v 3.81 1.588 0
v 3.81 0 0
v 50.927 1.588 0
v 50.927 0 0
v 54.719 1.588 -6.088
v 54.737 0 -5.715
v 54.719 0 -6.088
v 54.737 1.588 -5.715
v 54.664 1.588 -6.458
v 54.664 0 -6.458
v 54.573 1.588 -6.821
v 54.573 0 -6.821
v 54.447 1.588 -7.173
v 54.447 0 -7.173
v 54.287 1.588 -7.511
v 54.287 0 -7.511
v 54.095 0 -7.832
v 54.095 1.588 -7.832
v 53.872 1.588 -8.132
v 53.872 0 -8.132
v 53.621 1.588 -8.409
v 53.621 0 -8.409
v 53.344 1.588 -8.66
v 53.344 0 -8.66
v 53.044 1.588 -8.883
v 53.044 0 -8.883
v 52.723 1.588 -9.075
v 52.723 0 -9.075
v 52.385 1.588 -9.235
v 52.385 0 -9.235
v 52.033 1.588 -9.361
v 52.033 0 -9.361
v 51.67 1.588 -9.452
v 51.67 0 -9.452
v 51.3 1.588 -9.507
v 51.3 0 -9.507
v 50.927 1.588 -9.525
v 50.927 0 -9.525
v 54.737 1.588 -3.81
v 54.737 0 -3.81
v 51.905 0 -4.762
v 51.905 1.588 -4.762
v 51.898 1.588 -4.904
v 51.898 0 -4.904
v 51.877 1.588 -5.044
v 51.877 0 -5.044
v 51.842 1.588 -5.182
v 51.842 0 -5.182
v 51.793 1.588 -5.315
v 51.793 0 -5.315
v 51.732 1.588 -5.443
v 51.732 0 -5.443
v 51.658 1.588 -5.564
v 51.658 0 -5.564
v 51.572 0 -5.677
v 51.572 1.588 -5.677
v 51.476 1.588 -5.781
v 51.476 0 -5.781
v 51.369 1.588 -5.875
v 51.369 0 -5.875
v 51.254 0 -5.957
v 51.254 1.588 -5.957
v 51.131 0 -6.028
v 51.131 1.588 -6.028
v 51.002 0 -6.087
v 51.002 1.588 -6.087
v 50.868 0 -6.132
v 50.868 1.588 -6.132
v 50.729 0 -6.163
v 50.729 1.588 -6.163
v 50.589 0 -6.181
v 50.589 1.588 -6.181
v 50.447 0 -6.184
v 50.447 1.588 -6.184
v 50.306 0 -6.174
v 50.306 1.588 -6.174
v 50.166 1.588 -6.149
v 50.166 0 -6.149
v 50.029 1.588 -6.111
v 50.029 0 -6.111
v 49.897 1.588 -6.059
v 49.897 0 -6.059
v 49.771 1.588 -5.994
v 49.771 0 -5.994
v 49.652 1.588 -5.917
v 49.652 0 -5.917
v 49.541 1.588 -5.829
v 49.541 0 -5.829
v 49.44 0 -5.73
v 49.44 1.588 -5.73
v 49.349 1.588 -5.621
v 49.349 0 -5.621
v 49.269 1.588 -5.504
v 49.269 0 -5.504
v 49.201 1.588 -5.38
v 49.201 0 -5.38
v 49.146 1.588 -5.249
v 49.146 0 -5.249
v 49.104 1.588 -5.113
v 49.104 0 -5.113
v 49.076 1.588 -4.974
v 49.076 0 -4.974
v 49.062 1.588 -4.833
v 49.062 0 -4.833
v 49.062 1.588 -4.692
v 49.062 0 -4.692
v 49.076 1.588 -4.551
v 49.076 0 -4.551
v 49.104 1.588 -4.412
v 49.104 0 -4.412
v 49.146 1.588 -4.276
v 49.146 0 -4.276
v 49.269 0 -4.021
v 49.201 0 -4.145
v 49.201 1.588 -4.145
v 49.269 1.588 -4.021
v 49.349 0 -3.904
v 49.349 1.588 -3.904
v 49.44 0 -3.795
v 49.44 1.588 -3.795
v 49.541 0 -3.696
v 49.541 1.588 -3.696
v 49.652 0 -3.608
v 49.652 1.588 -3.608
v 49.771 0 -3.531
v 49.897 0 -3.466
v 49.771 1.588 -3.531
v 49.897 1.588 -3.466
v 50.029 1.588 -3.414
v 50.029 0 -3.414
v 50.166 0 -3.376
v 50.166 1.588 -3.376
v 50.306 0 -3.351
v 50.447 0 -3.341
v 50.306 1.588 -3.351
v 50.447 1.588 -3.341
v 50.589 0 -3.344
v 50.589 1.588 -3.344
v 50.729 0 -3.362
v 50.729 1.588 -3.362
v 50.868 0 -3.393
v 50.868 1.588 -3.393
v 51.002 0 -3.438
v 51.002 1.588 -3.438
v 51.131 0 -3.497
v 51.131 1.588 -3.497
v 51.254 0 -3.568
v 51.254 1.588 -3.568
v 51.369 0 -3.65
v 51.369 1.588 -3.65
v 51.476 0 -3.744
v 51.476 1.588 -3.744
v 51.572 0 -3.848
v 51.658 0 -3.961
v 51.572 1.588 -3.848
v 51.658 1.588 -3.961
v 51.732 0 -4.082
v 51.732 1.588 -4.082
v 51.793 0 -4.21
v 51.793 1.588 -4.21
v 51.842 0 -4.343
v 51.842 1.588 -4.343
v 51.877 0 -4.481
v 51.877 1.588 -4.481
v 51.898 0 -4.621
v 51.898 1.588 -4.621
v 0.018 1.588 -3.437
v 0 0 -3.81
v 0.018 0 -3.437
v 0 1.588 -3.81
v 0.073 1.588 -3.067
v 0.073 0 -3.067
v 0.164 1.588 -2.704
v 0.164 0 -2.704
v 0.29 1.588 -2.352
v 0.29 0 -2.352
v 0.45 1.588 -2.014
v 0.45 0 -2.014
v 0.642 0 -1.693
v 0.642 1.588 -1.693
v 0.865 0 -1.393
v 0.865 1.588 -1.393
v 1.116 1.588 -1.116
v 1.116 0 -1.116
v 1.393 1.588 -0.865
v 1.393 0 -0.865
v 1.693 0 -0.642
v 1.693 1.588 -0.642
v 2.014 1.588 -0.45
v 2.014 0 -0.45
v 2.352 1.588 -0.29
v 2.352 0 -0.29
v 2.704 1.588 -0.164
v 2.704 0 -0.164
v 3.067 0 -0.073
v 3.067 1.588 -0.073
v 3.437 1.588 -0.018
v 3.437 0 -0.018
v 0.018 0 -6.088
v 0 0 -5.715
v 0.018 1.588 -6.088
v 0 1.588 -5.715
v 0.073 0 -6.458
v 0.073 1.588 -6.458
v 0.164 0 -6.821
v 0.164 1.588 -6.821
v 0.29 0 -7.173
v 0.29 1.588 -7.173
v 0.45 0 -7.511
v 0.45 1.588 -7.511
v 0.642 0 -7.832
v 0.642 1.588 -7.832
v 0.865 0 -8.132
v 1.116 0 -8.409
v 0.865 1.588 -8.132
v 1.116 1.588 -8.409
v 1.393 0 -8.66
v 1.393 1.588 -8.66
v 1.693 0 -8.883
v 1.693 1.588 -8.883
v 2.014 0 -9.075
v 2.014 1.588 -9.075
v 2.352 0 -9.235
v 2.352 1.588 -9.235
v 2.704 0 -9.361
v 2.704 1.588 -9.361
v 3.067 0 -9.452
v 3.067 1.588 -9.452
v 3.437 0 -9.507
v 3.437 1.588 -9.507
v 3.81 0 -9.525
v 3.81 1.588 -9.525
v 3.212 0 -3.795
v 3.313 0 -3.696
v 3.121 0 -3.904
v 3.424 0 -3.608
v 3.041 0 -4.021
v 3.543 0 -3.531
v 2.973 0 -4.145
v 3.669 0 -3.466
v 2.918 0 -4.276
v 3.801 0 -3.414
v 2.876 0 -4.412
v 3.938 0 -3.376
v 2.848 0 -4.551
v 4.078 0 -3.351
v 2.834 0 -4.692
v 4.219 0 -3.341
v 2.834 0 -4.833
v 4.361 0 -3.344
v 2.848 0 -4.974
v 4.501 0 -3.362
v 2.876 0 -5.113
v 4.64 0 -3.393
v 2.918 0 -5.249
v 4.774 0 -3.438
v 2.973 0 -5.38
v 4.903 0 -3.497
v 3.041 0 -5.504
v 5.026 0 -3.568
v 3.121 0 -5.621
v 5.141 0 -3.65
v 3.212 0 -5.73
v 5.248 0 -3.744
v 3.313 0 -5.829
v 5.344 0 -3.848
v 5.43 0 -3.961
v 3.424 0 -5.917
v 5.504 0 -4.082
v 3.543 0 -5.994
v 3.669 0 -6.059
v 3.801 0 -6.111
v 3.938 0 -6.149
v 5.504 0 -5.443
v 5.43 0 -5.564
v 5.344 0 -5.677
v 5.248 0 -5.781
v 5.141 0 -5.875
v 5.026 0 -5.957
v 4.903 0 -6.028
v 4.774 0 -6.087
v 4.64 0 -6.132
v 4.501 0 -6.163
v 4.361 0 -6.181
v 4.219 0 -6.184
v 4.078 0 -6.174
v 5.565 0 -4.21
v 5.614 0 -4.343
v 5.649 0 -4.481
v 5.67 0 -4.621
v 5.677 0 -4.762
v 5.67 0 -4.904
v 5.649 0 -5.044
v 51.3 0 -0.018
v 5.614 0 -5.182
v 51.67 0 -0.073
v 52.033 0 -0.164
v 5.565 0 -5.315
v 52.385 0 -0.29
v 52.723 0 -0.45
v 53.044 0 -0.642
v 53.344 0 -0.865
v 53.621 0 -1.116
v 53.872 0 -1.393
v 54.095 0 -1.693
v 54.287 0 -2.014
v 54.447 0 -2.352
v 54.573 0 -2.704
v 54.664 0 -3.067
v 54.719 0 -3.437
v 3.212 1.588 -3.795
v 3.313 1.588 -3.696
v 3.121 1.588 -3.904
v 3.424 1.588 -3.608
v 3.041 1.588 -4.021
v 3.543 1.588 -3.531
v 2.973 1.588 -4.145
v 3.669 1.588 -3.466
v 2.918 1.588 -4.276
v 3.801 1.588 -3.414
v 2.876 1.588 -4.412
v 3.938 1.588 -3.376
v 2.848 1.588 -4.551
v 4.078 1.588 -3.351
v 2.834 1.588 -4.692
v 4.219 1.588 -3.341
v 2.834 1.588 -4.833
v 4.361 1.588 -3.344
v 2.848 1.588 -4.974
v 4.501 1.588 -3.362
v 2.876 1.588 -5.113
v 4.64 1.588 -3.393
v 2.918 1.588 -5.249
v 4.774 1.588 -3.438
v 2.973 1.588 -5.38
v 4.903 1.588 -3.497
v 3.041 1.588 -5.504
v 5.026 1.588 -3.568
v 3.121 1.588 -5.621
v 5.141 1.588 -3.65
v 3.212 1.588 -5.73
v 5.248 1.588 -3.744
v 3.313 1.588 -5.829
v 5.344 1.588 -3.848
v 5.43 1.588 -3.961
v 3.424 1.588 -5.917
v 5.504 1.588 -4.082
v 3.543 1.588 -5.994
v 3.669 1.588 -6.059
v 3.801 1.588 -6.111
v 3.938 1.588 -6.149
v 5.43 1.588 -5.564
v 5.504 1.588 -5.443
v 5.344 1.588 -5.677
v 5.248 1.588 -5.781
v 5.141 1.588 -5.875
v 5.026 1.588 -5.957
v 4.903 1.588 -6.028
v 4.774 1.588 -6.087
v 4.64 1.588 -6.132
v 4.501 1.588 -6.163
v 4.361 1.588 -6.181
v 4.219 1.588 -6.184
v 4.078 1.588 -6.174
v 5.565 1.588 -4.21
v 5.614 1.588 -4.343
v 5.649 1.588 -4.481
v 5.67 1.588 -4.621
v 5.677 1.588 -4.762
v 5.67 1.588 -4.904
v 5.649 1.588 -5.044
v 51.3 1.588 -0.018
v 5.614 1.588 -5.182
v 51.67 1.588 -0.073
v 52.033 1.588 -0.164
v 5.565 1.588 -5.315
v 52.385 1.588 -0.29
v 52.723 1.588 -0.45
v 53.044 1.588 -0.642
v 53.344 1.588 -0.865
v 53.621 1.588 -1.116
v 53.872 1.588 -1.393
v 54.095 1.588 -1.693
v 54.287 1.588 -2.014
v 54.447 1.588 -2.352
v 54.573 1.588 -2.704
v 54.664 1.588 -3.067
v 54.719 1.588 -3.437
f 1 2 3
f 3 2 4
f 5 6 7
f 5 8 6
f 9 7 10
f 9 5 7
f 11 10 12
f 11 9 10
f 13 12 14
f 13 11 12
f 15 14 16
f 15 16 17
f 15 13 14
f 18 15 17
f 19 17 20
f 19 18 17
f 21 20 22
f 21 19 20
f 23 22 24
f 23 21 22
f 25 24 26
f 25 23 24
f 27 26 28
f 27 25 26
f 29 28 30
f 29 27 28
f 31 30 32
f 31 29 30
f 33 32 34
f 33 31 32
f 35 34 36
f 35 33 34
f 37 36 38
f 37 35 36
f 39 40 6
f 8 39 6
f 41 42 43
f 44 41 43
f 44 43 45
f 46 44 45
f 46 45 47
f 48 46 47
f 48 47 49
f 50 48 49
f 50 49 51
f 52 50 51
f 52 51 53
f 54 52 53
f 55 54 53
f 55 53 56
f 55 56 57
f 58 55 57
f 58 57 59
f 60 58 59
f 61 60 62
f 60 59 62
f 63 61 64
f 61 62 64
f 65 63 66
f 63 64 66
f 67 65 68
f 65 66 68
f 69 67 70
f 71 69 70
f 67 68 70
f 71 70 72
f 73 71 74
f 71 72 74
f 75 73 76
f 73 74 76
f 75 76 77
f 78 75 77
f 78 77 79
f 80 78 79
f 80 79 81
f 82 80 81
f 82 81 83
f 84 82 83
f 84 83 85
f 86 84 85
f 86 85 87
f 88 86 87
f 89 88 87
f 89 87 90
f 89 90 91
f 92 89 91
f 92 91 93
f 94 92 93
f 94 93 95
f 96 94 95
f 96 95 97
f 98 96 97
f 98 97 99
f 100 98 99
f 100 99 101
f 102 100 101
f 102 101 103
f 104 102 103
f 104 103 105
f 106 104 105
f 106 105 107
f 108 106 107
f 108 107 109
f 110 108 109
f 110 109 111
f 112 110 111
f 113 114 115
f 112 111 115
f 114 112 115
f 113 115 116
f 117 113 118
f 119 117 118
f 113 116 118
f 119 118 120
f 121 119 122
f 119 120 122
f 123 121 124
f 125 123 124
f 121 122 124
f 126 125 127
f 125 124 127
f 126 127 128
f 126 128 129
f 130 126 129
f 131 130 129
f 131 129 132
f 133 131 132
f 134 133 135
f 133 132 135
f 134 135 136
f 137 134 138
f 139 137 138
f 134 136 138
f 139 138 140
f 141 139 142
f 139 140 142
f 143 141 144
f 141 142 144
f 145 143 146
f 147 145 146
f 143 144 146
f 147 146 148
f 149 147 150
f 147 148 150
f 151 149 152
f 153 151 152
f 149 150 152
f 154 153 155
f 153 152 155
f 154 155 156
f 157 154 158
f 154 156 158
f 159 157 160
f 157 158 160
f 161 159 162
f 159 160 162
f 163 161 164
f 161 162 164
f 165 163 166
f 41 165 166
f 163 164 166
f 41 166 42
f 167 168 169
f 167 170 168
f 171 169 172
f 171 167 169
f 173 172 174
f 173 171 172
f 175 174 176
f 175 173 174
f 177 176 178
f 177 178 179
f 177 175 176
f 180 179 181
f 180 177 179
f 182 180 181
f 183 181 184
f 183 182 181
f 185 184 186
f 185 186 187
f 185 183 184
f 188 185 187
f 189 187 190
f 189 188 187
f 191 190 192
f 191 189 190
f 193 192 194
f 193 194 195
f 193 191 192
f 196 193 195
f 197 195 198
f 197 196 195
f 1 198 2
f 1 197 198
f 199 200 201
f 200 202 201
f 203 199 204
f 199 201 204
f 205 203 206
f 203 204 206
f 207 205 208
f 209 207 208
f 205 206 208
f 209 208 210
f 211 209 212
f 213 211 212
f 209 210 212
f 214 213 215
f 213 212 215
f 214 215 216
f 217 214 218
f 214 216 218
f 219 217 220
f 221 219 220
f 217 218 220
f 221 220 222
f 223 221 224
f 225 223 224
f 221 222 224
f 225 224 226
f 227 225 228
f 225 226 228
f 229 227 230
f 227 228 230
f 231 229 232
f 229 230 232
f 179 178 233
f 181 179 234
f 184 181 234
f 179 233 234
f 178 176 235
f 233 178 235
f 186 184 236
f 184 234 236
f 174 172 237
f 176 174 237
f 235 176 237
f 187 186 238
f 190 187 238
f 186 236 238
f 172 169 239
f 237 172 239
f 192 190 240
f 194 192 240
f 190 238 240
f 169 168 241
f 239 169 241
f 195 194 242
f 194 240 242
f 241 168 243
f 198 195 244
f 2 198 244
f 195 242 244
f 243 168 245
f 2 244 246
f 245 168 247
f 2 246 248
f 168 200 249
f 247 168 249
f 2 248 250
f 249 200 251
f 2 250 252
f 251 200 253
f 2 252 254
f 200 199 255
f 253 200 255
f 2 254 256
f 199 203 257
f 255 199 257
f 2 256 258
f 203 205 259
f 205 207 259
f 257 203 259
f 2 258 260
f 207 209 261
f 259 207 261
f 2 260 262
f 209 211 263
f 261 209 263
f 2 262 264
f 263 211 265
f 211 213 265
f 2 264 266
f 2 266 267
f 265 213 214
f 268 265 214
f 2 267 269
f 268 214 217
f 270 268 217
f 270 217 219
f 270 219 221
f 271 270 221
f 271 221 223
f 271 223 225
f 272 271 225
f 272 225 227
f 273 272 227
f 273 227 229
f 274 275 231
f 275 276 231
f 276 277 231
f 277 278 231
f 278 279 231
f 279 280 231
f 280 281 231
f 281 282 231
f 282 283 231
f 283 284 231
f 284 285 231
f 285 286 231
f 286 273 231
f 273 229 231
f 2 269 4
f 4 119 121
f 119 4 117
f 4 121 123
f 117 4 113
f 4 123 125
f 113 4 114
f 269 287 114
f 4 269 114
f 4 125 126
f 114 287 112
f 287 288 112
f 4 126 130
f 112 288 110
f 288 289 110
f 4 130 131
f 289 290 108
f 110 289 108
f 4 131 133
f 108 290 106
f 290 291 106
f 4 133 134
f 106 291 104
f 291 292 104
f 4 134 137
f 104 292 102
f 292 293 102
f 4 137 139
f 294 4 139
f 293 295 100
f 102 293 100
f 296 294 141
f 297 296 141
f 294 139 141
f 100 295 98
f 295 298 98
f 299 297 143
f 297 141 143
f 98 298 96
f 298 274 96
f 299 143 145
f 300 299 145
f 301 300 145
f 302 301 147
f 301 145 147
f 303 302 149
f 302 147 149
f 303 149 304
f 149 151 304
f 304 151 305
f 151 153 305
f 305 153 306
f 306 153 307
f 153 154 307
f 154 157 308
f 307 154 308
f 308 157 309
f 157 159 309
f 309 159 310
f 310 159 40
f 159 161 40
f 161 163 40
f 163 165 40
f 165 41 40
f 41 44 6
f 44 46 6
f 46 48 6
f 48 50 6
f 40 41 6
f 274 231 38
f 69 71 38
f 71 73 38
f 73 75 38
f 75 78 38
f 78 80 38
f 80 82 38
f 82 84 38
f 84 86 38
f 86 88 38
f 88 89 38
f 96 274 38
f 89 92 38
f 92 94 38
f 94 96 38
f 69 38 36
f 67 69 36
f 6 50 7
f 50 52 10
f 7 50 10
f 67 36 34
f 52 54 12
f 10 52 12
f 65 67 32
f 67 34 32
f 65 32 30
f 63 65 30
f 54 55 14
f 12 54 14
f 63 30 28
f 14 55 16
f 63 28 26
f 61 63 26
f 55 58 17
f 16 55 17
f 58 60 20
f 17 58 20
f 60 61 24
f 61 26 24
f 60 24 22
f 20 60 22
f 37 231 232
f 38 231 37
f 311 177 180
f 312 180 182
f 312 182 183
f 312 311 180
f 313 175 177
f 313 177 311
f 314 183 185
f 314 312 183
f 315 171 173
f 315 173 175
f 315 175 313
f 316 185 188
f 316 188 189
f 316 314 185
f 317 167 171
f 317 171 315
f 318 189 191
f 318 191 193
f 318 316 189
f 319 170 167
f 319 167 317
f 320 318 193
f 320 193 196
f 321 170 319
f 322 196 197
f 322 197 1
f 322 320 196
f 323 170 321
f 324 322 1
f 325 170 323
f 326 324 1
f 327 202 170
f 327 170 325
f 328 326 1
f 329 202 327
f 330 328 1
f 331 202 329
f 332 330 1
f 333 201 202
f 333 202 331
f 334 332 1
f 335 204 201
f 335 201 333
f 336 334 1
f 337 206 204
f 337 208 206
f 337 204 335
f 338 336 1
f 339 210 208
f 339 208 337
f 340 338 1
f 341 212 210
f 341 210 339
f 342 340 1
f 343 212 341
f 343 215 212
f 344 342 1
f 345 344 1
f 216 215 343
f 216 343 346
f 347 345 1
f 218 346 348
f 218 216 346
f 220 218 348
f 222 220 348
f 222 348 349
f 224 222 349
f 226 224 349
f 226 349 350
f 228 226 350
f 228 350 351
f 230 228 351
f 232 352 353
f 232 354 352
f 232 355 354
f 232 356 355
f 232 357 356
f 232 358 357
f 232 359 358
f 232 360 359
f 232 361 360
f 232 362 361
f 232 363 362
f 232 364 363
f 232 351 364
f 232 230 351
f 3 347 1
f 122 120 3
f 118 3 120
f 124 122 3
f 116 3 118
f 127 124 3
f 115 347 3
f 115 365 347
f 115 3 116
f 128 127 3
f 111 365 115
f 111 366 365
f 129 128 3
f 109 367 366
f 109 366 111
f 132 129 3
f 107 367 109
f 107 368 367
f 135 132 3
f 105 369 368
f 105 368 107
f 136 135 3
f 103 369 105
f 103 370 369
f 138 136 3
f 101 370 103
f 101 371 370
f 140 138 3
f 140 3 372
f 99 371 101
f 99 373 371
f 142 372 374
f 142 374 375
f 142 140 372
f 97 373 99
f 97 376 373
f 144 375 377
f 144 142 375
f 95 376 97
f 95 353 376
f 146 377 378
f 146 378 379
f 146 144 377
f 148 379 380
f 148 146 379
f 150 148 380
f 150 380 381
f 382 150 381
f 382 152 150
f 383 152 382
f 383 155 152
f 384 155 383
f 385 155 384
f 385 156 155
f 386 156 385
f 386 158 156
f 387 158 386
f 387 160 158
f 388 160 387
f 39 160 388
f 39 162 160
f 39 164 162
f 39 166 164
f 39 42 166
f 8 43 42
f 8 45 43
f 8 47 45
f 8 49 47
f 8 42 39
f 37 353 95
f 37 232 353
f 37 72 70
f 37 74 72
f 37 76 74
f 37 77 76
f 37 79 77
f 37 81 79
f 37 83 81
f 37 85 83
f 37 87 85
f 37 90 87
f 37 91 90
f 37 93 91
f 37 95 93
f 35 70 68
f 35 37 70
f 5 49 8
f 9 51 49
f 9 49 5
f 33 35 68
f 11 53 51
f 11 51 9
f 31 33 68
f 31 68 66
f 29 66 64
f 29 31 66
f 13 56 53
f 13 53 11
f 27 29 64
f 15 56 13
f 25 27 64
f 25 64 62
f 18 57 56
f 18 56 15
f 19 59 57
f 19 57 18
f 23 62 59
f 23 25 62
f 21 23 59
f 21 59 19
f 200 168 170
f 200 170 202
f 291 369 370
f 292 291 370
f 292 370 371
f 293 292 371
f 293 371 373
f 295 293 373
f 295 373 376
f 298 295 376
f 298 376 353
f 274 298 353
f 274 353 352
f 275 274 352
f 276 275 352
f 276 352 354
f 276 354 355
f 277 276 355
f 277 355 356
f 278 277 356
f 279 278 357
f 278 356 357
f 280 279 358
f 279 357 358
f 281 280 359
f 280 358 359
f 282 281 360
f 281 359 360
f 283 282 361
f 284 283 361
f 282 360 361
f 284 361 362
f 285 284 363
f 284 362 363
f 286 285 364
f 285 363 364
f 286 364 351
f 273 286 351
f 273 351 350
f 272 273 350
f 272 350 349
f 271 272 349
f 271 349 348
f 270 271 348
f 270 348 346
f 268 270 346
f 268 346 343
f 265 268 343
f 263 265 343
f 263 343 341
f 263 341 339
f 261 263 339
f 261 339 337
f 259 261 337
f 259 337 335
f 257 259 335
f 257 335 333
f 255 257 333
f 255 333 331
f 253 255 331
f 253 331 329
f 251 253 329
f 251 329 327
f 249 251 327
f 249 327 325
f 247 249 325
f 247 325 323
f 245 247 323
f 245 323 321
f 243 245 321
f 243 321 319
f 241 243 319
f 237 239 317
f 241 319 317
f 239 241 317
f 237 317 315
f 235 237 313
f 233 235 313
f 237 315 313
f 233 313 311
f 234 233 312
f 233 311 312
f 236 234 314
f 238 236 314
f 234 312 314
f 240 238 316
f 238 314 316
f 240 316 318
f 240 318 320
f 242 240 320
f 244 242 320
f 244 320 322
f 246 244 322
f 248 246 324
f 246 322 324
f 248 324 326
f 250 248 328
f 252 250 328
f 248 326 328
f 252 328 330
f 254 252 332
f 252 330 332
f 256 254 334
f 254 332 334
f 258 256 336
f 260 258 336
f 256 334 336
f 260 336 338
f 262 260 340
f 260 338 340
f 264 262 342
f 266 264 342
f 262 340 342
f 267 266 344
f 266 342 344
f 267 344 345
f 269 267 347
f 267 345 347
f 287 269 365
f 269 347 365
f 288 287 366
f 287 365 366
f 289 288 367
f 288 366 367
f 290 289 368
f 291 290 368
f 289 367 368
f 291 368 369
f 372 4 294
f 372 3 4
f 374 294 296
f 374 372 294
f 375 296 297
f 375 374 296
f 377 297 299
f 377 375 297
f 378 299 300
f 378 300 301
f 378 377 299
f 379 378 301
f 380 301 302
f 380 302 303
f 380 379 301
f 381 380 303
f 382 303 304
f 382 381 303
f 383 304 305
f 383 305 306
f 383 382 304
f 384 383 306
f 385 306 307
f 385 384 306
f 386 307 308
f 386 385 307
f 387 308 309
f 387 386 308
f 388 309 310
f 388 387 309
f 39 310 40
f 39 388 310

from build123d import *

# Parameters (mm, degrees)
SKETCH1_W           = 54.737
SKETCH1_H           = 9.525
BOSS_EXTRUDE1_DEPTH = 1.5875
FILLET1_R           = 3.81
SKETCH2_R           = 1.4224
CUT_EXTRUDE1_DEPTH  = 2.5875


with BuildPart() as part:
    # Sketch1 → Boss-Extrude1 (new body)
    with BuildSketch(Plane(origin=(0, 0, 0), x_dir=(1, 0, 0), z_dir=(0, 1, 0))):
        with Locations((27.3685, 4.7625)):
            Rectangle(SKETCH1_W, SKETCH1_H)
    extrude(amount=BOSS_EXTRUDE1_DEPTH)

    # Fillet1
    fillet1_edges = [part.edges().sort_by_distance(p)[0] for p in [
        (0, 0.79375, -9.525),
        (54.737, 0.79375, -9.525),
        (54.737, 0.79375, 0),
        (0, 0.79375, 0),
    ]]
    fillet(fillet1_edges, radius=FILLET1_R)

    # Sketch2 → Cut-Extrude1 (cut, through all)
    with BuildSketch(Plane(origin=(0, 1.5875, 0), x_dir=(1, 0, 0), z_dir=(0, 1, 0))):
        with Locations((4.2545, 4.7625)):
            Circle(SKETCH2_R)
        with Locations((50.4825, 4.7625)):
            Circle(SKETCH2_R)
    extrude(amount=-CUT_EXTRUDE1_DEPTH, mode=Mode.SUBTRACT)


solid = part.part
